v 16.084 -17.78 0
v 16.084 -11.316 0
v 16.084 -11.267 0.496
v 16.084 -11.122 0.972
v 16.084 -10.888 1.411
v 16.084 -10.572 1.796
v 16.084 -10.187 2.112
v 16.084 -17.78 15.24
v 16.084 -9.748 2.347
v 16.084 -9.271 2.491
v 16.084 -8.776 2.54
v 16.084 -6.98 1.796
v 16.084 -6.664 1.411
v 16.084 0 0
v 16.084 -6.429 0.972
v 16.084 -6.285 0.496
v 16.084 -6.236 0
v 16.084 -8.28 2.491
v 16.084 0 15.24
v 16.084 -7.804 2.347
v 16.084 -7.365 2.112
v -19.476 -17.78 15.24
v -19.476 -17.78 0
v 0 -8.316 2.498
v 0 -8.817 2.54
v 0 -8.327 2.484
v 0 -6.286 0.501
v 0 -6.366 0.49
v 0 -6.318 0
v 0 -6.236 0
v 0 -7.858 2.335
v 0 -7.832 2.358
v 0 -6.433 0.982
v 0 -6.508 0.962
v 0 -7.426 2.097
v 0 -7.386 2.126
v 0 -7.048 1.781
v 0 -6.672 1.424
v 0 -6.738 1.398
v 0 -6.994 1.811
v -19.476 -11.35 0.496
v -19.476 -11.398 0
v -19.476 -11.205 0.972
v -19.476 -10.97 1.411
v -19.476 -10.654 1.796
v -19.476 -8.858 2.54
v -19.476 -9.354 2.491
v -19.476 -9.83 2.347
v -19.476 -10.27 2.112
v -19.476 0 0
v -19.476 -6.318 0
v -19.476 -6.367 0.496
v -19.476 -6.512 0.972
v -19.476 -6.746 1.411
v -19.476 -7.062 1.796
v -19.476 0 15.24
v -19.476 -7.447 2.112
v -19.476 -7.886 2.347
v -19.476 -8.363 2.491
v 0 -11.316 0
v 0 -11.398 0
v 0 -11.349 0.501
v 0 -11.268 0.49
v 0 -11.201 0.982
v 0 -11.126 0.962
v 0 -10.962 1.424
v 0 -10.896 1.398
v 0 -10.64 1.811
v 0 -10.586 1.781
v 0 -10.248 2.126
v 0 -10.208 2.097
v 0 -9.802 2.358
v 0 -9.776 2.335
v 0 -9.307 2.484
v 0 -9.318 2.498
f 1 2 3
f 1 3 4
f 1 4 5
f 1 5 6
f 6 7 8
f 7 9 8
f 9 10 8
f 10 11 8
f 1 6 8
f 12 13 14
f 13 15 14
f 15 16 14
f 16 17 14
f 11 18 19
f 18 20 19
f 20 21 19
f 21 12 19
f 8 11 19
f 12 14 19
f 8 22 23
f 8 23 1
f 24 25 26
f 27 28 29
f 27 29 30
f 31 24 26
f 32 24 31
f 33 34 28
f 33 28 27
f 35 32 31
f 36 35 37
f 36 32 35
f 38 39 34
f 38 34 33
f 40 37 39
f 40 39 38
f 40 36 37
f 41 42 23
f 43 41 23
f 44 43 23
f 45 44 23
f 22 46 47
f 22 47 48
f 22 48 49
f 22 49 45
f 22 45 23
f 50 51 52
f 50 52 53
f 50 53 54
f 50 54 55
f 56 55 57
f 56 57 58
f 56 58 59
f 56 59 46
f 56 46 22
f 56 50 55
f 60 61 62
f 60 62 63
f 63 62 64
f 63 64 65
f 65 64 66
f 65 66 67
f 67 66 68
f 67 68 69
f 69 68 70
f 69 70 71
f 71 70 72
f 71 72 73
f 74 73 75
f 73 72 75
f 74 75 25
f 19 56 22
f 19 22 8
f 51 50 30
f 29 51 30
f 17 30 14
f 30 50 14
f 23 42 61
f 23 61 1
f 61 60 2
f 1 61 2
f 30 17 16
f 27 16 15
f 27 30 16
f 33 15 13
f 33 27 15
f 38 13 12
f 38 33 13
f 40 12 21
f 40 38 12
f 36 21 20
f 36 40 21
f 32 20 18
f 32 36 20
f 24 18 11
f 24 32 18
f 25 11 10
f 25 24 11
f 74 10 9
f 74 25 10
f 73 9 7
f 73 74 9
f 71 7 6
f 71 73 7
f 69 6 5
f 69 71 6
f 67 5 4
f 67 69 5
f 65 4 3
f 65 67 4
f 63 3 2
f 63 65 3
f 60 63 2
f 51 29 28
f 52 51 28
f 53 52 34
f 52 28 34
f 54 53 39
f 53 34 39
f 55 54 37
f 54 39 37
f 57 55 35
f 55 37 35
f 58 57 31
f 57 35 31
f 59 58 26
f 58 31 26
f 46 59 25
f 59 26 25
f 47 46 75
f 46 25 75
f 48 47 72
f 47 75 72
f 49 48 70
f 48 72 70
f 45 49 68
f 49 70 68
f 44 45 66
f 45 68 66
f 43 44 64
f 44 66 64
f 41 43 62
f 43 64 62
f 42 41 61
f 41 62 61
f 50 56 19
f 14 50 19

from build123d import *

# Parameters (mm, degrees)
F0_W     = 35.56
F0_H     = 15.24
F1_DEPTH = 17.78
F2_R     = 2.54
F3_DEPTH = 25.4
F4_R     = 2.54
F5_DEPTH = 25.4


with BuildPart() as f1:
    # F0 (on Front) → F1 (new body)
    with BuildSketch(Plane.XZ):
        with Locations((-1.695781, 7.62)):
            Rectangle(F0_W, F0_H)
    extrude(amount=F1_DEPTH)

    # F2 (on Right) → F3 (cut)
    with BuildSketch(Plane.YZ):
        with Locations((-8.775705, 0)):
            Circle(F2_R)
    extrude(amount=F3_DEPTH, mode=Mode.SUBTRACT)

    # F4 (on Right) → F5 (cut)
    with BuildSketch(Plane.YZ):
        with Locations((-8.858354, 0)):
            Circle(F4_R)
    extrude(amount=-F5_DEPTH, mode=Mode.SUBTRACT)


solid = f1.part
